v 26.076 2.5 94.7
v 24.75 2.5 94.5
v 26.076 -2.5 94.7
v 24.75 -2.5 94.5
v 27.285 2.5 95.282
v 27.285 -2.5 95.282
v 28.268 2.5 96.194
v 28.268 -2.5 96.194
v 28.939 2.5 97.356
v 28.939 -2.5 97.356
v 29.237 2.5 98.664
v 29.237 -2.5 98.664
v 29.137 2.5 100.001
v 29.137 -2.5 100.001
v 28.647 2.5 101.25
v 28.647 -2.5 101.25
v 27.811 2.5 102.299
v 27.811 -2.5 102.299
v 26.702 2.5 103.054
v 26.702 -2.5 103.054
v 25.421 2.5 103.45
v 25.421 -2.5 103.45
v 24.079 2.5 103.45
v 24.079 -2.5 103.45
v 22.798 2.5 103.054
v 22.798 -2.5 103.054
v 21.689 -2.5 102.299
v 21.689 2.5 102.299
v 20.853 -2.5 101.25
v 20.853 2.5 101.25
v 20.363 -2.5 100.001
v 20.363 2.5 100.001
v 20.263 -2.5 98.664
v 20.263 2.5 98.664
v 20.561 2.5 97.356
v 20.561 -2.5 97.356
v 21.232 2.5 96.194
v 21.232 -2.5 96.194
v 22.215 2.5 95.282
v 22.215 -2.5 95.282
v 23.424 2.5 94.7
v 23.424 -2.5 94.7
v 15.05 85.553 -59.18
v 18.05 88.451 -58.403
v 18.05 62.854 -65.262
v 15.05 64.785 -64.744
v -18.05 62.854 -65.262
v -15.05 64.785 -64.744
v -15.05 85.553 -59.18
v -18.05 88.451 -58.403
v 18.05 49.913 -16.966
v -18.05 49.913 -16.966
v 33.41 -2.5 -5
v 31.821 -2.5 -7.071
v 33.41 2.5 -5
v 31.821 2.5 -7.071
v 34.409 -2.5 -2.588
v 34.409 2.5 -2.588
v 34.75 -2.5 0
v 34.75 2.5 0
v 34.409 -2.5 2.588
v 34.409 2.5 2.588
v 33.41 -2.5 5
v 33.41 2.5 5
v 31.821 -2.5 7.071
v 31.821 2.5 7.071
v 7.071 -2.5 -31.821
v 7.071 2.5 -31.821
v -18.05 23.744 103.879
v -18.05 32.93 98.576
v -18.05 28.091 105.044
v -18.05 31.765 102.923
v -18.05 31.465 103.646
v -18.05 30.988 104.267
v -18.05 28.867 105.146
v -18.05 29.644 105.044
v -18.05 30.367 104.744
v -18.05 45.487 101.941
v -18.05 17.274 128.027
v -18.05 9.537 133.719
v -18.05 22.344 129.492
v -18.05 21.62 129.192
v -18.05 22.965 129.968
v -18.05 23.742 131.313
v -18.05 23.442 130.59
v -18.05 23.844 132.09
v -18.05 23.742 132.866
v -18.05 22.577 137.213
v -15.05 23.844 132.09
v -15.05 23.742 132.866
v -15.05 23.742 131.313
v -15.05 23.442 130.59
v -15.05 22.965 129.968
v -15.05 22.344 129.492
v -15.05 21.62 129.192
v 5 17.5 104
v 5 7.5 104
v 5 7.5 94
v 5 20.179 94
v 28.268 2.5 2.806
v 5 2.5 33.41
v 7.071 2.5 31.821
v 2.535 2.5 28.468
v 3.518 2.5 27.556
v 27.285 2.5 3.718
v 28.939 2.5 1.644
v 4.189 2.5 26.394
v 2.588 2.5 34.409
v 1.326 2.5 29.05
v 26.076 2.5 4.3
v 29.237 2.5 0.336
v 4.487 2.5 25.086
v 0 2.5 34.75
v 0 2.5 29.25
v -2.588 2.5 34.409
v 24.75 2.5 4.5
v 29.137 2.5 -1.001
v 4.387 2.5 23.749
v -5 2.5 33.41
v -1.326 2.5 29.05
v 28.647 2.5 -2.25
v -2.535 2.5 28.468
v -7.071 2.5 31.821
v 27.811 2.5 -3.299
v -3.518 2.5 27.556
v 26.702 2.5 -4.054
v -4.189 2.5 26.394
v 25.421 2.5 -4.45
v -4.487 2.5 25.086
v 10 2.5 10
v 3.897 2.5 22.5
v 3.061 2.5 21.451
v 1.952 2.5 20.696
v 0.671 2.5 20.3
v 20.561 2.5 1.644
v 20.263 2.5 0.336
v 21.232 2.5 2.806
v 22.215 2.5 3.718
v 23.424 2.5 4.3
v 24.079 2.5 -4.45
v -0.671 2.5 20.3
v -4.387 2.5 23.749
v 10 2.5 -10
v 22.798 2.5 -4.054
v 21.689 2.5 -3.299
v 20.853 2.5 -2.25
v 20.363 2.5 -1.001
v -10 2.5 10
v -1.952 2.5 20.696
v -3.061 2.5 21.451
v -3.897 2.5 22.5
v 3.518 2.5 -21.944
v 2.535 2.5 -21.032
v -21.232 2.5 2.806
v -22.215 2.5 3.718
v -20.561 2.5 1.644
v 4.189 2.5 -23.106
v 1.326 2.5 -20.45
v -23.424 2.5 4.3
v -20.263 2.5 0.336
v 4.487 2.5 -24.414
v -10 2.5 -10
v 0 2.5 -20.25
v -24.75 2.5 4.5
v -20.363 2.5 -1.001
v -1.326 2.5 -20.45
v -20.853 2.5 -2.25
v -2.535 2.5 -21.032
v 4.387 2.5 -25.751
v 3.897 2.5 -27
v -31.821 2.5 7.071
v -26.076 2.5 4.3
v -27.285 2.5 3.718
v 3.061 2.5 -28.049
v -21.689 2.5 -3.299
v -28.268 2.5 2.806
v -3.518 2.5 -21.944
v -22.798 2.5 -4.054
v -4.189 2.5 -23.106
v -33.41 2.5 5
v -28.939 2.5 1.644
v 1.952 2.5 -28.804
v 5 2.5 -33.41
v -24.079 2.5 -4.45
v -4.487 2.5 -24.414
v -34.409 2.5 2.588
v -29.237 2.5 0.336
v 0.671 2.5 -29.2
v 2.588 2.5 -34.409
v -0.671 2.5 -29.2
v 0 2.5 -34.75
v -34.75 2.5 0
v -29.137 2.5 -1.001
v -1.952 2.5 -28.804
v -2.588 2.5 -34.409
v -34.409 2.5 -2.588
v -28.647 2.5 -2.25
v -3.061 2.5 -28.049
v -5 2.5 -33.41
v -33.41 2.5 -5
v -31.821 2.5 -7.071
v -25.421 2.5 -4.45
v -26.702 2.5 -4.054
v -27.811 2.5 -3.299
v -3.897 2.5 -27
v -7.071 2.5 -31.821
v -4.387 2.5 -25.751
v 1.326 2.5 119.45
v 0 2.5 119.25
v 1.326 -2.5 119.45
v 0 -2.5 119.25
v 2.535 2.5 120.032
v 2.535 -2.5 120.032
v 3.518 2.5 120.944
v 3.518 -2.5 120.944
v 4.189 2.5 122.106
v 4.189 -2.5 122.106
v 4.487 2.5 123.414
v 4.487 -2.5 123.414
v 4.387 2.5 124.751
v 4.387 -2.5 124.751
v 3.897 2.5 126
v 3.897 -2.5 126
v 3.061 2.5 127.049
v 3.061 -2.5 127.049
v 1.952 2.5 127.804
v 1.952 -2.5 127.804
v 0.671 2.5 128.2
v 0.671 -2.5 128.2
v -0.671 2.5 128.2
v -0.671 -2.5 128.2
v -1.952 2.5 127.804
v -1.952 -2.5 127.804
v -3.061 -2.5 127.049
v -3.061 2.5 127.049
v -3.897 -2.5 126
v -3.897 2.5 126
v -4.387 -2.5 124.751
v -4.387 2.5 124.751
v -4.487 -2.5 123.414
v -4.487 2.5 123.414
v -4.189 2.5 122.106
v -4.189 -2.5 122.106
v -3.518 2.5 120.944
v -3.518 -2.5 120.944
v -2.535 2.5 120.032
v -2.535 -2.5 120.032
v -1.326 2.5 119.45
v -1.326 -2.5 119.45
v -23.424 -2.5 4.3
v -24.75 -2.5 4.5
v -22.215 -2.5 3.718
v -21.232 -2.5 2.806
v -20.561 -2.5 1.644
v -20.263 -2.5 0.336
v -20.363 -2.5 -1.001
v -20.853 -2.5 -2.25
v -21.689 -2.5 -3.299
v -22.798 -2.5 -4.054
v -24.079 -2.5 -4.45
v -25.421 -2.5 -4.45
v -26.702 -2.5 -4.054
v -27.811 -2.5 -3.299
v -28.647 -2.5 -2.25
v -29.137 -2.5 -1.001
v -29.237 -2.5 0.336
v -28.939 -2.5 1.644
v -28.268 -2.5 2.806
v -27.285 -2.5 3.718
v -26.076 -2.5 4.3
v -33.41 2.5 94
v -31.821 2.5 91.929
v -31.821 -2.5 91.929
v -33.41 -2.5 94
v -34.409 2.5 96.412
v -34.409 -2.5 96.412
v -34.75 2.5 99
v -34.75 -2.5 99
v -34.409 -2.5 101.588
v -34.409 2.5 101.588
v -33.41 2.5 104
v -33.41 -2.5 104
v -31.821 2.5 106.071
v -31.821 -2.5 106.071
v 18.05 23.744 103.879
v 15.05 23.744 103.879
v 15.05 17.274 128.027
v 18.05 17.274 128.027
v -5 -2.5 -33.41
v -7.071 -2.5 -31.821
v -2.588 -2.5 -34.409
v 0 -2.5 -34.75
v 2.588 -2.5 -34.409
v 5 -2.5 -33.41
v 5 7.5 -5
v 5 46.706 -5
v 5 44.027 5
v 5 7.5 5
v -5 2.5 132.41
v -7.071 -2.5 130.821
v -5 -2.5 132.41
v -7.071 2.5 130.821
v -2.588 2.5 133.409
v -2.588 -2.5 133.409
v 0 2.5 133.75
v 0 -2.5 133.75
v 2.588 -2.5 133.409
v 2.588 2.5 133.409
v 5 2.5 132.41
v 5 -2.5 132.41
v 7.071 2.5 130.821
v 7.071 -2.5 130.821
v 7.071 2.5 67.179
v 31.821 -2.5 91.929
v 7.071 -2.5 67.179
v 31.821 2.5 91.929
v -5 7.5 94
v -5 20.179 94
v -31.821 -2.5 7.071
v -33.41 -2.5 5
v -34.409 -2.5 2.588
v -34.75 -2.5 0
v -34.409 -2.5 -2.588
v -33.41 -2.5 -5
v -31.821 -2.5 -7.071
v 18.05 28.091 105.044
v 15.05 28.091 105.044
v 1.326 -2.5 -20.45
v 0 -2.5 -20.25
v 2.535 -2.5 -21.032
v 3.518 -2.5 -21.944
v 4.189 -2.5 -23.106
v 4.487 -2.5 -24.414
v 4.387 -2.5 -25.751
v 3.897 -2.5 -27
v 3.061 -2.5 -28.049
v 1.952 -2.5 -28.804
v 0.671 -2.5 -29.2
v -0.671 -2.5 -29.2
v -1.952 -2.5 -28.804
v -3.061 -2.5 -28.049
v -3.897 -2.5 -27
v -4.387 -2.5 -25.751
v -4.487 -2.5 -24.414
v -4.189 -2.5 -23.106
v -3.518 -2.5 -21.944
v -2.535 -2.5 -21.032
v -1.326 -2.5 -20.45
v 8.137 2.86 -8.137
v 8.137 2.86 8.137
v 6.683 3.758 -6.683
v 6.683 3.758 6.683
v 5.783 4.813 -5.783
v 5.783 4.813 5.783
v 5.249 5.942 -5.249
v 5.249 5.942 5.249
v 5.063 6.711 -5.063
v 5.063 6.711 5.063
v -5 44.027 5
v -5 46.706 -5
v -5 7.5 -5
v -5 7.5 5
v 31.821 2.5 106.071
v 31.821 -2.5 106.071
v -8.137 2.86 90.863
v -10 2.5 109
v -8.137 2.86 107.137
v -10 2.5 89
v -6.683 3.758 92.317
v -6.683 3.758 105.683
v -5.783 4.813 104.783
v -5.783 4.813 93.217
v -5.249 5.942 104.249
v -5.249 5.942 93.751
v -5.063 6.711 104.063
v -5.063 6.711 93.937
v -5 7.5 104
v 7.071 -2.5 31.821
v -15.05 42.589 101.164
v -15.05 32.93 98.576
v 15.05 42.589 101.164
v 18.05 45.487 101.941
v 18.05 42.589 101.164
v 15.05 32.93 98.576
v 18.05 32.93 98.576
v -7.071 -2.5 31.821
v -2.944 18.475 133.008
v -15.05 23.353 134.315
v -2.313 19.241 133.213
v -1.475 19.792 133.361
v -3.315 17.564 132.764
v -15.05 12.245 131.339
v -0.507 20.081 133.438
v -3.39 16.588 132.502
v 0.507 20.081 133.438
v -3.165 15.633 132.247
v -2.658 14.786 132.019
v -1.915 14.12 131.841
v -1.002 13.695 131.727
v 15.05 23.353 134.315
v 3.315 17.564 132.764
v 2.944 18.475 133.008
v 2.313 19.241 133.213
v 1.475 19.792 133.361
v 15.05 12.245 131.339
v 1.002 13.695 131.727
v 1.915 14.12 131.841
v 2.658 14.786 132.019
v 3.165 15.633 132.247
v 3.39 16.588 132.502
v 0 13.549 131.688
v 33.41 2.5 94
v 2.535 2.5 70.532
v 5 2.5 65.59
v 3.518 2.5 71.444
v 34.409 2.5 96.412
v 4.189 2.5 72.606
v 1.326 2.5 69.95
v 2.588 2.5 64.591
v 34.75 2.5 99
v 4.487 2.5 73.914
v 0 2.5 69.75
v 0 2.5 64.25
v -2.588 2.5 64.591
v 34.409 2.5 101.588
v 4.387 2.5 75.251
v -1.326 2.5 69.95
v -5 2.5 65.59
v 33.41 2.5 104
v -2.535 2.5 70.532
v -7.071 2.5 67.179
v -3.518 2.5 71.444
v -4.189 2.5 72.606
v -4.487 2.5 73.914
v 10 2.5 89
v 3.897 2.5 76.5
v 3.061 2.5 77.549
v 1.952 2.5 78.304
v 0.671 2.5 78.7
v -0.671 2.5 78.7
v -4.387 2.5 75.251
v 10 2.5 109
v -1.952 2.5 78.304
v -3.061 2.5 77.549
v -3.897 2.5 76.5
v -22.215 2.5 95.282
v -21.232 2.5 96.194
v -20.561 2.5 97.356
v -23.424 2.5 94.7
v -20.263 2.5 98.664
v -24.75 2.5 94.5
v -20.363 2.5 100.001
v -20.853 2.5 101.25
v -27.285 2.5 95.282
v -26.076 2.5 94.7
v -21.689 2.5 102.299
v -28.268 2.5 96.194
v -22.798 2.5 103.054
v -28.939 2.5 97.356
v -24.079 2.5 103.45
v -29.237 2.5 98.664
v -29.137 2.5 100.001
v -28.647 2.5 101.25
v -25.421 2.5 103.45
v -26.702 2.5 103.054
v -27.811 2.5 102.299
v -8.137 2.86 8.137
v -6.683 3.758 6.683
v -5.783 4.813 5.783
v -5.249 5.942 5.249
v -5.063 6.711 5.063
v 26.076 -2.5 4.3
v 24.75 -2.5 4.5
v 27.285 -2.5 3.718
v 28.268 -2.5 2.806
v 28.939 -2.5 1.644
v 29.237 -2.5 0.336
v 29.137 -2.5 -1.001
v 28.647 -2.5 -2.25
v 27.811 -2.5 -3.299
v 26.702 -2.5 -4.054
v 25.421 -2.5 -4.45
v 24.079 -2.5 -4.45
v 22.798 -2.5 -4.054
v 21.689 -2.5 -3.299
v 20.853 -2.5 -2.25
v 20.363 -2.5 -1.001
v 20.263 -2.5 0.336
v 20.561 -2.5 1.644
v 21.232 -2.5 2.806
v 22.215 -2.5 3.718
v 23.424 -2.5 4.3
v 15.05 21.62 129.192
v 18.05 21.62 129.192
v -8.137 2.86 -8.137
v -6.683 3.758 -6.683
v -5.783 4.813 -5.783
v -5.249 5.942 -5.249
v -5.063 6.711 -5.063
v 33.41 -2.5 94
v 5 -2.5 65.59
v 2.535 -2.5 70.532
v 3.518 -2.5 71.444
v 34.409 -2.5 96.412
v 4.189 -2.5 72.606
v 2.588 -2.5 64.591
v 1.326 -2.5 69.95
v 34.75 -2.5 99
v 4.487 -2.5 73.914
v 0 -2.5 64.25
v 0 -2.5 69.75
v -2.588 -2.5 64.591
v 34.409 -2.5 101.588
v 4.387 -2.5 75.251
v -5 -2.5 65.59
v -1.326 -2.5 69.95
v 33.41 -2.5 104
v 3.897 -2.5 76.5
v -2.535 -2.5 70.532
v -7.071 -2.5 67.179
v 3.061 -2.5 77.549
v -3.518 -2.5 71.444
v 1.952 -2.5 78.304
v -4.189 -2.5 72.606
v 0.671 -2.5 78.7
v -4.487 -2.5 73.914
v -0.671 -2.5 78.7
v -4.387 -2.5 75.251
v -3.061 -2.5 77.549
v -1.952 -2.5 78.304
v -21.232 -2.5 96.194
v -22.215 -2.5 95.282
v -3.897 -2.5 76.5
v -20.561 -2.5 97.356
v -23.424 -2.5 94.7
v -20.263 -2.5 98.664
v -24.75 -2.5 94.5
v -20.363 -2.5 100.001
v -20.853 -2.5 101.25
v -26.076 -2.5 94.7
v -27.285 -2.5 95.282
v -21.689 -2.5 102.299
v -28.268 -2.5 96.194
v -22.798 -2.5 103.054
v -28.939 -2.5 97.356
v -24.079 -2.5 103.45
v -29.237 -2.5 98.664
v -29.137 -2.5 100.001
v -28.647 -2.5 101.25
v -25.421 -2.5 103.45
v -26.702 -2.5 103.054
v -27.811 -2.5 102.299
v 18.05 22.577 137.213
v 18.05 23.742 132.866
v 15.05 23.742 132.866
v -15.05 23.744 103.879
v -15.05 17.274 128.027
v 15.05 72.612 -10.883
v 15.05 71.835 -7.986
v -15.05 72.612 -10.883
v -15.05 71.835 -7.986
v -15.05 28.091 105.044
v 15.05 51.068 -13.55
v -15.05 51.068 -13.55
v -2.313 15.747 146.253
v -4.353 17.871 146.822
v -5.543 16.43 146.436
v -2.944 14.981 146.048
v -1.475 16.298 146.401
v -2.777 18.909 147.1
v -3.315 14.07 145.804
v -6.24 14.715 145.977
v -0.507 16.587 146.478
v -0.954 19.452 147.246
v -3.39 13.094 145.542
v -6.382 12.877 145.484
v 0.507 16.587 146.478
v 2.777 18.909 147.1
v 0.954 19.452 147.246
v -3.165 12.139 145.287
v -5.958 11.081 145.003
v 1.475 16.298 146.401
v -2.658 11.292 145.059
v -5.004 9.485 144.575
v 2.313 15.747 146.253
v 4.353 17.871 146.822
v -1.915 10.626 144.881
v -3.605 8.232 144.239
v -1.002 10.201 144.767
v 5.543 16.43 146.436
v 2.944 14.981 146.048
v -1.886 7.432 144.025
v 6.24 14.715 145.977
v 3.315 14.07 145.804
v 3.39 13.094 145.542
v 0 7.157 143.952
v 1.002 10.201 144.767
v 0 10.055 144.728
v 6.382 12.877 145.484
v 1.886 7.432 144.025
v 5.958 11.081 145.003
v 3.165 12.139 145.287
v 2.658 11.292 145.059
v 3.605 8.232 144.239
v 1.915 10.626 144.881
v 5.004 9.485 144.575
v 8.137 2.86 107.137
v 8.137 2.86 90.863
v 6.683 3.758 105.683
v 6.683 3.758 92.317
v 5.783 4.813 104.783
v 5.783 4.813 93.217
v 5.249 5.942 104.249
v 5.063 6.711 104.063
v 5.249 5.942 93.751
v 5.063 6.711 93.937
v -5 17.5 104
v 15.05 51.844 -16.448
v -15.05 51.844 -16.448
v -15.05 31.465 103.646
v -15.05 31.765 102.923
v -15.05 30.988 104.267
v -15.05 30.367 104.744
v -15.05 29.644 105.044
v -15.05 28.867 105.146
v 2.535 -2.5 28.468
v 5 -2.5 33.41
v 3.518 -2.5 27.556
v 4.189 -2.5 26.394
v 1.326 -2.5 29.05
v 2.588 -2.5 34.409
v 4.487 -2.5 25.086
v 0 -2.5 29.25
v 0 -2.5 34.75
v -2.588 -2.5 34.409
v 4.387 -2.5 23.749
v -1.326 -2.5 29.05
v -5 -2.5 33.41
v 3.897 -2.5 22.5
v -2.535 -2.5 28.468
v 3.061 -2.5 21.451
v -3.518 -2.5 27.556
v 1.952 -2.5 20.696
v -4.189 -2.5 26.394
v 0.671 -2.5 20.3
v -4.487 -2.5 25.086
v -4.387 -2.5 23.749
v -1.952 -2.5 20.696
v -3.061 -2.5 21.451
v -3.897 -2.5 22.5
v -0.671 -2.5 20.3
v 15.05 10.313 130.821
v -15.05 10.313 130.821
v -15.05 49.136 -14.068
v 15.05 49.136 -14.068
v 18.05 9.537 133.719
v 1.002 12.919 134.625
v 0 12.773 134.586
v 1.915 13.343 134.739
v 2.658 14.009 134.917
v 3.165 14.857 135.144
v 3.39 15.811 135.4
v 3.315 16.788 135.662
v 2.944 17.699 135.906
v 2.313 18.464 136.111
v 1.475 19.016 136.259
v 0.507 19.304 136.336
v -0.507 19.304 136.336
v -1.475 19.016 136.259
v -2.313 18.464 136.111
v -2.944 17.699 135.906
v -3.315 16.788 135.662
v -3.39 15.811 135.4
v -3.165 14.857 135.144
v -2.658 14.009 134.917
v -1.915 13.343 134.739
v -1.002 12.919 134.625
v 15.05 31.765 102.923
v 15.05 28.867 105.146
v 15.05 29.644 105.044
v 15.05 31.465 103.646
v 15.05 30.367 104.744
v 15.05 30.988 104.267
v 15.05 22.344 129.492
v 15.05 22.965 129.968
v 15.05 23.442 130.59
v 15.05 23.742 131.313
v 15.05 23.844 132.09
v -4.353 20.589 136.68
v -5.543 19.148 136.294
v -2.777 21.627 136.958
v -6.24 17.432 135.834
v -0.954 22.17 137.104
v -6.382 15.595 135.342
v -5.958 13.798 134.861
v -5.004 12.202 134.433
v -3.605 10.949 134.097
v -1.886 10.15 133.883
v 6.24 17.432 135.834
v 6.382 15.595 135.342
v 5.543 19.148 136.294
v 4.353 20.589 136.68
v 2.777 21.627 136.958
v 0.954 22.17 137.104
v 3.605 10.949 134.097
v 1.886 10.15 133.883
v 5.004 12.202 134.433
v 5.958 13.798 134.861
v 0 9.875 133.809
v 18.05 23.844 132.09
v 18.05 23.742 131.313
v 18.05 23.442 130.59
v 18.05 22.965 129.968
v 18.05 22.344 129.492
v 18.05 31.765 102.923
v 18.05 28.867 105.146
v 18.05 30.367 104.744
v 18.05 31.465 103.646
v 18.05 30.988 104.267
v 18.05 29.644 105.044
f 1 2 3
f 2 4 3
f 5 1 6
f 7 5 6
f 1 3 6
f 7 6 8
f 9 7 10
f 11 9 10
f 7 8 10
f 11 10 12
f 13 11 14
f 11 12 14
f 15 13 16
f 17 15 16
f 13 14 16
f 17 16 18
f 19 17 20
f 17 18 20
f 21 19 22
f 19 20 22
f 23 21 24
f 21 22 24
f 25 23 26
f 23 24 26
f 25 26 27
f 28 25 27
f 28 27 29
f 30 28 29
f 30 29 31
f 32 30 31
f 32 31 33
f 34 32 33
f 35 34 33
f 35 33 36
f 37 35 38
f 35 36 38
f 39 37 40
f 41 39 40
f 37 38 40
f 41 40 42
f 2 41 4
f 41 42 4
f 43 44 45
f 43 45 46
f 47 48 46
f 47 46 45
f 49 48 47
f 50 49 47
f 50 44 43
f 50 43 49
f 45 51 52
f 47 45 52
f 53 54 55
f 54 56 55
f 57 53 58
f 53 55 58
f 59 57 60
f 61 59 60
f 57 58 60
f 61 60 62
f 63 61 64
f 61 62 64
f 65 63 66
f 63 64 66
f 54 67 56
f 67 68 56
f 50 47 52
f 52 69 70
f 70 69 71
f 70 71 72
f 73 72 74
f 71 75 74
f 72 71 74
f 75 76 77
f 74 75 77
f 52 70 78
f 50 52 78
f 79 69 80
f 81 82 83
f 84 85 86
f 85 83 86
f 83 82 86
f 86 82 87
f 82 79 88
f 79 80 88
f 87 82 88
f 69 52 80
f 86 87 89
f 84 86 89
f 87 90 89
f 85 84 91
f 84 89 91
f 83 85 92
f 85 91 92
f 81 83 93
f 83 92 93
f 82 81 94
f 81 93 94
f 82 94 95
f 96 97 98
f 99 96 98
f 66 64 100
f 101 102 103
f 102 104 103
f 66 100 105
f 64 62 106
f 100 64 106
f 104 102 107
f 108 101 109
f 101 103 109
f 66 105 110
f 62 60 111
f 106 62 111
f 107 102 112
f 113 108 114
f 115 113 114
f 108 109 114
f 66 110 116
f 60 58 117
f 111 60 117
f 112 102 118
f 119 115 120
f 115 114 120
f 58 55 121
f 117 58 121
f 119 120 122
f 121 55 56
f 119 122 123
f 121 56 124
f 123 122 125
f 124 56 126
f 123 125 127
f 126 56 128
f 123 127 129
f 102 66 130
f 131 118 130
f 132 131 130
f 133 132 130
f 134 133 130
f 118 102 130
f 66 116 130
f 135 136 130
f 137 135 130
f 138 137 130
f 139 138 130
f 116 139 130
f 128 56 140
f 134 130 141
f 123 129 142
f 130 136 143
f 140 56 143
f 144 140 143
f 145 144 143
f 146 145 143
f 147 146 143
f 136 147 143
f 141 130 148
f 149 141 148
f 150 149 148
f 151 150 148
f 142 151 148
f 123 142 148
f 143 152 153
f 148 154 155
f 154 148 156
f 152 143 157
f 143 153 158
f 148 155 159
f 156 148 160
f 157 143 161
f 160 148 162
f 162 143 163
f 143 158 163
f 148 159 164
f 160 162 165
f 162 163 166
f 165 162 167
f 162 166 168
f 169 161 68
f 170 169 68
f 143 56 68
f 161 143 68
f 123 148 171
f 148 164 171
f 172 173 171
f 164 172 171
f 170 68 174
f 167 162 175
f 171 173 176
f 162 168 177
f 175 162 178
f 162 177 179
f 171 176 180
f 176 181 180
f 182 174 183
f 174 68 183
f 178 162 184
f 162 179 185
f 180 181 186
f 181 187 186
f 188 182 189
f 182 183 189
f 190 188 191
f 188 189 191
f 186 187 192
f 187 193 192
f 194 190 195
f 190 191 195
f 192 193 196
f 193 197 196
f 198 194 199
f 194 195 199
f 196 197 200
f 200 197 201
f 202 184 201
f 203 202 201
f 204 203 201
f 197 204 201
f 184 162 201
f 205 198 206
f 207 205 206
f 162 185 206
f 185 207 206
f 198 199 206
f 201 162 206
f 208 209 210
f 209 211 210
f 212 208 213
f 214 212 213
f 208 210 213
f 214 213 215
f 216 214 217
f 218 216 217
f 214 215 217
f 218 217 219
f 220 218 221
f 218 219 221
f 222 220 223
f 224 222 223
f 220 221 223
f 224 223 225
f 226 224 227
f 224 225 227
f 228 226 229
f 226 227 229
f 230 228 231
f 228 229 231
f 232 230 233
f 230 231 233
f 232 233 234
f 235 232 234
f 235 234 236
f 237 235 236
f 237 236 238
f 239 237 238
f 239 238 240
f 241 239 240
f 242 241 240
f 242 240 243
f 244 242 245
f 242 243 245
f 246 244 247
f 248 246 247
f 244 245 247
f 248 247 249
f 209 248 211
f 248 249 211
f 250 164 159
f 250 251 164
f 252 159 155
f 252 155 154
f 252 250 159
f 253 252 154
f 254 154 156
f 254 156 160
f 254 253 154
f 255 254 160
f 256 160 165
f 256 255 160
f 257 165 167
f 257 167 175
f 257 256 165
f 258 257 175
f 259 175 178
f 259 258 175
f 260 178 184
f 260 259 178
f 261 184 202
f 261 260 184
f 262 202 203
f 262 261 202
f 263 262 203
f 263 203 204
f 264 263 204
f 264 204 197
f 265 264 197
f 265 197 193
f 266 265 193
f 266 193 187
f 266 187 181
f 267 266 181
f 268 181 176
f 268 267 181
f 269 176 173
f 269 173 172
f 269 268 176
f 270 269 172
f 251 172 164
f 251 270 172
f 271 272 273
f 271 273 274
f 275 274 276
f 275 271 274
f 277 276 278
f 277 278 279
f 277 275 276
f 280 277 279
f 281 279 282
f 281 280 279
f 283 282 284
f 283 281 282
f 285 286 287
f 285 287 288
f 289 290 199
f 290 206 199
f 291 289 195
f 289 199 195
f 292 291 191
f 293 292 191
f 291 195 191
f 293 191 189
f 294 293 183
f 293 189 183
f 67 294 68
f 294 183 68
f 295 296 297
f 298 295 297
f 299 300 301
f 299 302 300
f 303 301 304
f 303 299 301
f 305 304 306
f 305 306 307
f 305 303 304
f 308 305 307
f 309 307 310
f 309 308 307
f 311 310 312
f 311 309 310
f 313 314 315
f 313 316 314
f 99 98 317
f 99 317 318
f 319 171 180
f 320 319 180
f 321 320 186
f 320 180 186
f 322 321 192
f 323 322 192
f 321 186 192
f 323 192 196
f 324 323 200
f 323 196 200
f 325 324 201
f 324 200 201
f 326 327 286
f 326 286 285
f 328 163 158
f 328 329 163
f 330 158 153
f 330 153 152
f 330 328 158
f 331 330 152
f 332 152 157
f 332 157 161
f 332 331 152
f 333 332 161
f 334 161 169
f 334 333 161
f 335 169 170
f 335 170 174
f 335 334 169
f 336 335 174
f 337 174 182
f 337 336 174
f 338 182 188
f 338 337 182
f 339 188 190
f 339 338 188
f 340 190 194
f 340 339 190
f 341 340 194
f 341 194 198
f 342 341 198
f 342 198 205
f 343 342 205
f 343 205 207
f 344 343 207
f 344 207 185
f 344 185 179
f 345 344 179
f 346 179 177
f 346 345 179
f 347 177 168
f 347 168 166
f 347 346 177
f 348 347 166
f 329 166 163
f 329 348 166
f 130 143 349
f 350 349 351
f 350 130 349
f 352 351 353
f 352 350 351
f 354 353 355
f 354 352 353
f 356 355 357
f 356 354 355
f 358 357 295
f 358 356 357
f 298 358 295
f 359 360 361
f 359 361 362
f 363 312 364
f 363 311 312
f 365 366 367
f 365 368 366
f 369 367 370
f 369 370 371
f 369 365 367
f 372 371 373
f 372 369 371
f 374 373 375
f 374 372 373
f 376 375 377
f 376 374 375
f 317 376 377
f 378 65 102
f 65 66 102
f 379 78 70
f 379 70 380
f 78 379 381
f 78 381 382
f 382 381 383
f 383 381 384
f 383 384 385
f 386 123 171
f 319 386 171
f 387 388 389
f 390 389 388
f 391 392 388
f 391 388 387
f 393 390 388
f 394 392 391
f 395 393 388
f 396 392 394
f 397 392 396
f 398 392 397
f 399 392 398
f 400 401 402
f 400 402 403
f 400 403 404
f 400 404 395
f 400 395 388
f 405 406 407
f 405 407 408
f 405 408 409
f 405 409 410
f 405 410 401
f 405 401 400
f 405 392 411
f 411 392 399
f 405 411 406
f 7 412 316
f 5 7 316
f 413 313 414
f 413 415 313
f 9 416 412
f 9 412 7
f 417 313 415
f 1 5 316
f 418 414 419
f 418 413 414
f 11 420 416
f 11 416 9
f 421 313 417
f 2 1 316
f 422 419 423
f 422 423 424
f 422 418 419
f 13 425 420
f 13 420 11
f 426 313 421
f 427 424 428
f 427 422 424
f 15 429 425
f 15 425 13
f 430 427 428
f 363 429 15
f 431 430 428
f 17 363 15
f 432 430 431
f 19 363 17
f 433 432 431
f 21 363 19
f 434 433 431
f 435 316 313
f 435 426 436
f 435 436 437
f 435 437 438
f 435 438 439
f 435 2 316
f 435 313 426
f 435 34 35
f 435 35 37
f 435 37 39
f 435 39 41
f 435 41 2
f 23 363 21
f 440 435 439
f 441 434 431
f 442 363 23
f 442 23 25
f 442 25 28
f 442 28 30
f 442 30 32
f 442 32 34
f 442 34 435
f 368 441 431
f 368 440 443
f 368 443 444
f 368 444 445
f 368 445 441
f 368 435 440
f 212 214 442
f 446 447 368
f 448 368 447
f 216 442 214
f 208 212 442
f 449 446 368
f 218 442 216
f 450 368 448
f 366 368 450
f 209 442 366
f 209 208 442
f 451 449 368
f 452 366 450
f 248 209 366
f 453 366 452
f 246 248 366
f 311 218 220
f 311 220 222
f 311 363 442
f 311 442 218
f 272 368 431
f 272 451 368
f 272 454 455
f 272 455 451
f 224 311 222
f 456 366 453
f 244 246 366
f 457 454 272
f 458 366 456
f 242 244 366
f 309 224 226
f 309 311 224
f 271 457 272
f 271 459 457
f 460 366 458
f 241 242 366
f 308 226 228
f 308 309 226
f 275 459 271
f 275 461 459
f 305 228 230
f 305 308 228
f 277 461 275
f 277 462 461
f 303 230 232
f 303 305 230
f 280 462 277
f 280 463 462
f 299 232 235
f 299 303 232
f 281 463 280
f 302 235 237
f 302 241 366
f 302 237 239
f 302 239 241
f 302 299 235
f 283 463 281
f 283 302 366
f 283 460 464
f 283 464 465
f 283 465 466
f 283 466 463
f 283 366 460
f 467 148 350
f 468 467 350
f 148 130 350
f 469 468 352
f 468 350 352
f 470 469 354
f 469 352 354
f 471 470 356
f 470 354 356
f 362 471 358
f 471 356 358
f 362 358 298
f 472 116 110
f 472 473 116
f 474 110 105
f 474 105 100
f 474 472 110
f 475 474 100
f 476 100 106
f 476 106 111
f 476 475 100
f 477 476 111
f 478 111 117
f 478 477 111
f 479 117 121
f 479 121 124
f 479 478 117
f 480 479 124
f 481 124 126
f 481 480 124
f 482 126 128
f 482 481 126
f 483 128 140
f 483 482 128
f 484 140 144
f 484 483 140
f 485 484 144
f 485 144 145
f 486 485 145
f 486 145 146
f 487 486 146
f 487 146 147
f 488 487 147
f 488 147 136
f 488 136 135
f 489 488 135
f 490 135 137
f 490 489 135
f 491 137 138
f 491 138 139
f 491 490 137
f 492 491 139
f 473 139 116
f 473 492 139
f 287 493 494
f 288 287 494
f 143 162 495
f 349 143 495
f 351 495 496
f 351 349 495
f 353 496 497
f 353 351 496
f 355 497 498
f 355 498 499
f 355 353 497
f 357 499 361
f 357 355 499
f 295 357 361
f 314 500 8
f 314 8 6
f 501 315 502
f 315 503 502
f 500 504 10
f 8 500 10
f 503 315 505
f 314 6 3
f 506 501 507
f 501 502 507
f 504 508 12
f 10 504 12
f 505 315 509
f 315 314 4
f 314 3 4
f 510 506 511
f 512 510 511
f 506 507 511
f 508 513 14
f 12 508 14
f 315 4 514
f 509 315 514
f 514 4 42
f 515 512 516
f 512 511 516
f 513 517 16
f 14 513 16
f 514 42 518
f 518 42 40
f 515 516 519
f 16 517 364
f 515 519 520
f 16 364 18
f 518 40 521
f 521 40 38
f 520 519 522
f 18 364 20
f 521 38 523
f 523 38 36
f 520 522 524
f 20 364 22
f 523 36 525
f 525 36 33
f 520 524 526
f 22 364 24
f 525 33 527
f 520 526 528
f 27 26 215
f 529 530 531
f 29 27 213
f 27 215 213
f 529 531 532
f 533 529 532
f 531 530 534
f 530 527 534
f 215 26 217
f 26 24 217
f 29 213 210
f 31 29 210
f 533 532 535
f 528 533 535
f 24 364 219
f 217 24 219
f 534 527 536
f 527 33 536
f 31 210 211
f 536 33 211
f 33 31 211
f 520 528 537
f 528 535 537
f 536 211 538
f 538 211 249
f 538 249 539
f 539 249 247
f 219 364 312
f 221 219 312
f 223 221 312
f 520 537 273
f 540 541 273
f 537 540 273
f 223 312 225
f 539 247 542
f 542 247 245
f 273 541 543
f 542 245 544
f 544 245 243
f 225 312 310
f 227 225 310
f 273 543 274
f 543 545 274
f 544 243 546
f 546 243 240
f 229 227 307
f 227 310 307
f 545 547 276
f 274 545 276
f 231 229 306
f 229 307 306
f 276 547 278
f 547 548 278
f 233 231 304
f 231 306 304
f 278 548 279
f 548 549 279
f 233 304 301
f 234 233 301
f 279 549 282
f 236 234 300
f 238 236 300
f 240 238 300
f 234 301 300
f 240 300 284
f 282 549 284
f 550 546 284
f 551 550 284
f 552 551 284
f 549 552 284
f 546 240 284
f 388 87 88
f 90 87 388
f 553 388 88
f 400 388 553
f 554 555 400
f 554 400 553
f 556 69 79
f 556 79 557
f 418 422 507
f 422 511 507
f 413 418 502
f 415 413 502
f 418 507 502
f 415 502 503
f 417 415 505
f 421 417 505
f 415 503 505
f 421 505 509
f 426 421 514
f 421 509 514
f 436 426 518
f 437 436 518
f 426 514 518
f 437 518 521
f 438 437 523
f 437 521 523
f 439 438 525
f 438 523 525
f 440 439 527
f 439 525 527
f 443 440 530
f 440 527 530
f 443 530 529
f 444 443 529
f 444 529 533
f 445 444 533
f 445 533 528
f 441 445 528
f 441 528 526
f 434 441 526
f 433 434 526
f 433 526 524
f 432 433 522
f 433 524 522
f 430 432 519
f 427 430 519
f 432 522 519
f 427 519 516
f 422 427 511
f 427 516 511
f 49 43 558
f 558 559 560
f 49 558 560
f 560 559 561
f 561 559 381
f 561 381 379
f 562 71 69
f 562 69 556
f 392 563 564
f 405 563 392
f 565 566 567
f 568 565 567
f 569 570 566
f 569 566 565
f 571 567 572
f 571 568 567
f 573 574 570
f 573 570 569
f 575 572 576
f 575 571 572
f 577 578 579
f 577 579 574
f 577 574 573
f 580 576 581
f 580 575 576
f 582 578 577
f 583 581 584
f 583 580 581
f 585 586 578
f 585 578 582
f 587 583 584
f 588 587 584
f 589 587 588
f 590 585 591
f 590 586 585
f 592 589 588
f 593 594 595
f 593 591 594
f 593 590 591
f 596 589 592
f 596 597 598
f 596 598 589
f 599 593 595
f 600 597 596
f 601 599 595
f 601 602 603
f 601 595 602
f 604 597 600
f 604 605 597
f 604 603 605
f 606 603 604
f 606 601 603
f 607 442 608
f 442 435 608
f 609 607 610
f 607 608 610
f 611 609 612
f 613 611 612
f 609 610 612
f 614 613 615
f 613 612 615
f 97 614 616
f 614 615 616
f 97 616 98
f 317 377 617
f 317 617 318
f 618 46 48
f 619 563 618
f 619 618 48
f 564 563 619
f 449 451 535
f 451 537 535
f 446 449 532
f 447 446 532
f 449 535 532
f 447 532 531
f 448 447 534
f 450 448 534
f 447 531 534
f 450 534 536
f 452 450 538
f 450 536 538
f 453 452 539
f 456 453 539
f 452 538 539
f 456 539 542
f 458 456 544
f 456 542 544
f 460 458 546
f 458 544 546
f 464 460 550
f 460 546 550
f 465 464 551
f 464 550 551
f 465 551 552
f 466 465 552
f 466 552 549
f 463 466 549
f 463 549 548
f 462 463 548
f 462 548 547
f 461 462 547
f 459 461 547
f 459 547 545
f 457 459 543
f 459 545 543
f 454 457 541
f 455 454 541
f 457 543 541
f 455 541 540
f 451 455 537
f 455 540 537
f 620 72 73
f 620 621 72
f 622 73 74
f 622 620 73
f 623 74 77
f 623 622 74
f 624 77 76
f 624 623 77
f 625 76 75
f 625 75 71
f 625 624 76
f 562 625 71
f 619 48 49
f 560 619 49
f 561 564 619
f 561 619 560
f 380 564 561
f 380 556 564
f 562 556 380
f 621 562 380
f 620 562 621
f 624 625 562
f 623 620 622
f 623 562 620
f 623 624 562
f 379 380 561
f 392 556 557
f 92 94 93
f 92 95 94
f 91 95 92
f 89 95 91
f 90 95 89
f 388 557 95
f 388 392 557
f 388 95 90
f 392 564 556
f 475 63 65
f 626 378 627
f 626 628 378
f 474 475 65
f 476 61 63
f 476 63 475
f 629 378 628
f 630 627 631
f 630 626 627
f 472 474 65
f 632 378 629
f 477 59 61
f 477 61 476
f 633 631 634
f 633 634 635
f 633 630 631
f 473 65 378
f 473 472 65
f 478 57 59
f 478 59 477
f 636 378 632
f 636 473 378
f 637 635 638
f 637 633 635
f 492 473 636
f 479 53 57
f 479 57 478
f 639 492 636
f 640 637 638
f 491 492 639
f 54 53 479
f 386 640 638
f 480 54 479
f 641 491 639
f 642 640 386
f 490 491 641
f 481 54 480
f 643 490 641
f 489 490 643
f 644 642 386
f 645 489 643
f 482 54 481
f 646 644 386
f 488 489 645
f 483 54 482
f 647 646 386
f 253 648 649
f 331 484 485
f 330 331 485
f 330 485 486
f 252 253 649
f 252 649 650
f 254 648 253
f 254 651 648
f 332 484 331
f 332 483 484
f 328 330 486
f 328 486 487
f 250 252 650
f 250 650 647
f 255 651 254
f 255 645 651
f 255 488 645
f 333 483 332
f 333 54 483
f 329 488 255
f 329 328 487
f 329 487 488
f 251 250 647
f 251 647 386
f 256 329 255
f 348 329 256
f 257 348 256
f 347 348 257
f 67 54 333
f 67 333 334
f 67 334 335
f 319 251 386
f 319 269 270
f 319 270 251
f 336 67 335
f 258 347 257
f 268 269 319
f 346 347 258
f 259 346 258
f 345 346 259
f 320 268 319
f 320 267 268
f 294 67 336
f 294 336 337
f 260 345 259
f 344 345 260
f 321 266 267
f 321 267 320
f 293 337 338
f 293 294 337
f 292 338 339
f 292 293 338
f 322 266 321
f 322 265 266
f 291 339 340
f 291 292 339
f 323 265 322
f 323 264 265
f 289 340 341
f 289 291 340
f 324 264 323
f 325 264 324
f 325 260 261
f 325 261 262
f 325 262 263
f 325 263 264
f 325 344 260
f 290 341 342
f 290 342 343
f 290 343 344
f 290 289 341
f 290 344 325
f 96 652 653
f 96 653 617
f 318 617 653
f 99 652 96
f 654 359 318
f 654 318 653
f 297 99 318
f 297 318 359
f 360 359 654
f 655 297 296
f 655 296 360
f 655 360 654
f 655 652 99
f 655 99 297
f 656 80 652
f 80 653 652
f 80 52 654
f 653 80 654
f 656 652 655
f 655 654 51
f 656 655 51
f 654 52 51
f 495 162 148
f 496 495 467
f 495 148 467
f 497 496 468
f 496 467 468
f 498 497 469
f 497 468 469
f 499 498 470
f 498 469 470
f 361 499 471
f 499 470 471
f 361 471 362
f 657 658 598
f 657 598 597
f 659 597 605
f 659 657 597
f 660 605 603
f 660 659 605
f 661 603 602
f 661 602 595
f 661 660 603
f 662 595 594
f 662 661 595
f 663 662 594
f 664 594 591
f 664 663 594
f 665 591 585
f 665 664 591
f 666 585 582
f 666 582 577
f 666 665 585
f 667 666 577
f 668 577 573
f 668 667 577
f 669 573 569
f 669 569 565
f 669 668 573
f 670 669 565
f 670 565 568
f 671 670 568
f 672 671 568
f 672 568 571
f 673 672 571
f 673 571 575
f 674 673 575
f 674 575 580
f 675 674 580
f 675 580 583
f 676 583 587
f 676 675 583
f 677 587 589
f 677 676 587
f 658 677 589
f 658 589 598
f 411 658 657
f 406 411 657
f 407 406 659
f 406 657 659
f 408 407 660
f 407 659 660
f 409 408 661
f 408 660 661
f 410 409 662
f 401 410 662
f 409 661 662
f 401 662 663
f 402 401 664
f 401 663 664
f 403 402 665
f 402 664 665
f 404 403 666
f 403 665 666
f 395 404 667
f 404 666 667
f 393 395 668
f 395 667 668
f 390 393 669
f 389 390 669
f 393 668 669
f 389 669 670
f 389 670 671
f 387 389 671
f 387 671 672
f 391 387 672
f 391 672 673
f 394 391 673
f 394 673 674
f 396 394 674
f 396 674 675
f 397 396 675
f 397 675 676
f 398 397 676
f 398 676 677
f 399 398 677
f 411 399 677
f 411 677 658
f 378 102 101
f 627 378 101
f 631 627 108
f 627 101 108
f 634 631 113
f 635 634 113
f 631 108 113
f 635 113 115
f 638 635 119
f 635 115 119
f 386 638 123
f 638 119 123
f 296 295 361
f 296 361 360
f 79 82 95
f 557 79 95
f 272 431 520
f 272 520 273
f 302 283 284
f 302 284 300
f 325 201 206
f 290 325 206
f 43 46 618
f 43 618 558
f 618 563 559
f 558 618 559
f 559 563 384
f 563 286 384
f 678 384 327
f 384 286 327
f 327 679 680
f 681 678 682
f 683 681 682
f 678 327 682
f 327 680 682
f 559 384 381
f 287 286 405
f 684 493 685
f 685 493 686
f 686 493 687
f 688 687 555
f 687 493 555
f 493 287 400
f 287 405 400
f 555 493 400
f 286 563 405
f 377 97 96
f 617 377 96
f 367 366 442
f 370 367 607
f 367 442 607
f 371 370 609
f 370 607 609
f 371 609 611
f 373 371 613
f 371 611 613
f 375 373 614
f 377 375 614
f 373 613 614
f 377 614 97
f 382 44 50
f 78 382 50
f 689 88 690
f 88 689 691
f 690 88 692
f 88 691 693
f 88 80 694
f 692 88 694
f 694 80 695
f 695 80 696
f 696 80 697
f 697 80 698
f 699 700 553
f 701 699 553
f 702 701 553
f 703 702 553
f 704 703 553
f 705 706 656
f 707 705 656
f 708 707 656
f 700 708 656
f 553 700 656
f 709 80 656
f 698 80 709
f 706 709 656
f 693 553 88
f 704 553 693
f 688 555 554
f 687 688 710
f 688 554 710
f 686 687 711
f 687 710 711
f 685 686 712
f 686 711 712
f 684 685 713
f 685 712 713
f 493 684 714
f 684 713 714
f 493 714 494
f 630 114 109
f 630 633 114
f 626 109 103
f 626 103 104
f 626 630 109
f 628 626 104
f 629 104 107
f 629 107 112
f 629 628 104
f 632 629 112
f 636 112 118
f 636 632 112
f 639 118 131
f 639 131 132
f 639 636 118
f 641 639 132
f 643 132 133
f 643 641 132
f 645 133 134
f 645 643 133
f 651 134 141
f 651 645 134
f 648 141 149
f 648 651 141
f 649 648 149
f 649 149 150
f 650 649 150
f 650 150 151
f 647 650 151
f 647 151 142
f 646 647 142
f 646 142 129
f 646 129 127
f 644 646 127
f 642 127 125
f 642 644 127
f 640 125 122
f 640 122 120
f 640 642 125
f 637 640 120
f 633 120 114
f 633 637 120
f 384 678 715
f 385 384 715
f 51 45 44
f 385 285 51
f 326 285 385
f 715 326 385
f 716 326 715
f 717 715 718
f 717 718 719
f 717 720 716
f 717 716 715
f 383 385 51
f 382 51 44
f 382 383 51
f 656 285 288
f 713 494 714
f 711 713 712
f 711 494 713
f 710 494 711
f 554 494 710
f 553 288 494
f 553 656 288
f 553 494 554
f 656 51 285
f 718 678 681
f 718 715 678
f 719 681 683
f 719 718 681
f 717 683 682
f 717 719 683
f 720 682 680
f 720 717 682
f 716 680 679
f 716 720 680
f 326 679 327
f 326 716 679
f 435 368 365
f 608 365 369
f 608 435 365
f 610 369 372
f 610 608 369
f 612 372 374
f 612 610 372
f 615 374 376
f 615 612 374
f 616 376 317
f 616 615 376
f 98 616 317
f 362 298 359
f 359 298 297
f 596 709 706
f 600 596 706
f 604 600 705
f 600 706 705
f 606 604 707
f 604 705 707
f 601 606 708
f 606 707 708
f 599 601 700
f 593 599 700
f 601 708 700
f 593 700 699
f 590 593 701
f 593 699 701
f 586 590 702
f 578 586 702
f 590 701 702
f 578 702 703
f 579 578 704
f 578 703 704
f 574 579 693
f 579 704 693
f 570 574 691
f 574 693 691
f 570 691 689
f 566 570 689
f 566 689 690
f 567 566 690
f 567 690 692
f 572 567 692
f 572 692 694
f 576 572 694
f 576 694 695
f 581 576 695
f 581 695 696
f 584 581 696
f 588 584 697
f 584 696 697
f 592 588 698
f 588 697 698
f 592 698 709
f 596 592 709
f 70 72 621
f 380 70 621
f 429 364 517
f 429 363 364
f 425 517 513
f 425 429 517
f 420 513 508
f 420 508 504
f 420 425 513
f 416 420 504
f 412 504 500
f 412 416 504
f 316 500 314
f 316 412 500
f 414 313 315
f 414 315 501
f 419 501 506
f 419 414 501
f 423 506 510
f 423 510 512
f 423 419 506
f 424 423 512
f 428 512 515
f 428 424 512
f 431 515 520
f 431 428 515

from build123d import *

# Parameters (mm, degrees)
SKETCH1_R                = 4.5
BOSS_EXTRUDE1_DEPTH      = 2.5
SKETCH2_W                = 10
SKETCH2_H                = 45
BOSS_EXTRUDE2_DEPTH      = 5
CUT_EXTRUDE1_DEPTH       = 147.126229678
CUT_EXTRUDE1_DEPTH_BACK  = 147.126229678
BOSS_EXTRUDE3_DEPTH      = 15.05
FILLET1_R                = 5
FILLET2_R                = 5
BOSS_EXTRUDE4_DEPTH      = 16.5
BOSS_EXTRUDE4_DEPTH_BACK = 2.000004
SKETCH6_W                = 36.1
SKETCH6_H                = 156
SKETCH6_W_2              = 30.1
SKETCH6_H_2              = 150
BOSS_EXTRUDE5_DEPTH      = 5
SKETCH8_W                = 36.1
SKETCH8_H                = 116
BOSS_EXTRUDE6_DEPTH      = 3
CUT_EXTRUDE2_REACH       = 183.097
SKETCH10_W               = 30.1
SKETCH10_H               = 21.5
SKETCH11_W               = 36.1
SKETCH11_H               = 40
CUT_EXTRUDE3_DEPTH       = 5
SKETCH12_W               = 3
SKETCH12_H               = 25
CUT_EXTRUDE4_DEPTH       = 7.5
CUT_EXTRUDE5_REACH       = 195.973
SKETCH13_R               = 3.4
SKETCH14_R               = 6.4
SKETCH14_R_2             = 3.4
BOSS_EXTRUDE7_DEPTH      = 10.5
FILLET3_R                = 3
SKETCH15_W               = 36.1
SKETCH15_H               = 26.5
SKETCH15_W_2             = 30.1
SKETCH15_H_2             = 21.5
BOSS_EXTRUDE8_DEPTH      = 50


with BuildPart() as part:
    # Sketch1 → Boss-Extrude1 (new, symmetric)
    with BuildSketch(Plane(origin=(0, 0, 0), x_dir=(1, 0, 0), z_dir=(0, 1, 0))):
        with BuildLine():
            Line((-31.821067812, 7.071067812), (-7.071067812, 31.821067812))
            ThreePointArc((-7.071067812, 31.821067812), (0, 34.75), (7.071067812, 31.821067812))
            Line((7.071067812, 31.821067812), (31.821067812, 7.071067812))
            ThreePointArc((31.821067812, 7.071067812), (34.75, 0), (31.821067812, -7.071067812))
            Line((31.821067812, -7.071067812), (7.071067812, -31.821067812))
            ThreePointArc((7.071067812, -31.821067812), (0, -34.75), (-7.071067812, -31.821067812))
            Line((-7.071067812, -31.821067812), (-31.821067812, -7.071067812))
            ThreePointArc((-31.821067812, -7.071067812), (-34.75, 0), (-31.821067812, 7.071067812))
        make_face()
        with Locations(Location((0, 24.75, 0), (0, 0, 270))):
            Circle(SKETCH1_R, mode=Mode.SUBTRACT)
        with Locations(Location((24.75, 0, 0), (0, 0, 270))):
            Circle(SKETCH1_R, mode=Mode.SUBTRACT)
        with Locations(Location((0, -24.75, 0), (0, 0, 270))):
            Circle(SKETCH1_R, mode=Mode.SUBTRACT)
        with Locations(Location((-24.75, 0, 0), (0, 0, 270))):
            Circle(SKETCH1_R, mode=Mode.SUBTRACT)
    extrude(amount=BOSS_EXTRUDE1_DEPTH, both=True)


with BuildPart() as body_2:
    # Mirror3: mirrored copy
    add(part.part.mirror(Plane.XY.offset(49.5)))


with BuildPart() as body_3:
    # Sketch2 → Boss-Extrude2 (new, symmetric)
    with BuildSketch(Plane(origin=(0, 0, 0), x_dir=(0, 0, -1), z_dir=(1, 0, 0))):
        with Locations((-99, 25)):
            Rectangle(SKETCH2_W, SKETCH2_H)
    extrude(amount=BOSS_EXTRUDE2_DEPTH, both=True)


with BuildPart() as body_4:
    # Mirror5: mirrored copy
    add(body_3.part.mirror(Plane.XY.offset(49.5)))


with BuildPart() as cut_extrude1_tool:
    # Sketch3 → Cut-Extrude1 (new, two sides: drawn at the far end of the back side and taken through both)
    with BuildSketch(Plane(origin=(0, 0, 0), x_dir=(0, 0, -1), z_dir=(1, 0, 0)).offset(-CUT_EXTRUDE1_DEPTH_BACK)):
        Polygon((-398.060619113, -61.293305417), (-104, 17.5), (5, 46.706461975), (299.060619113, 125.499767392), (141.474008279, 713.621005618), (-555.647229947, 526.827932809), align=None)
    extrude(amount=CUT_EXTRUDE1_DEPTH + CUT_EXTRUDE1_DEPTH_BACK)


with BuildPart() as body_3_1:
    add(body_3.part)

    # Cut-Extrude1: cut by cut_extrude1_tool
    add(cut_extrude1_tool.part, mode=Mode.SUBTRACT)


with BuildPart() as body_4_1:
    add(body_4.part)

    # Cut-Extrude1: cut by cut_extrude1_tool
    add(cut_extrude1_tool.part, mode=Mode.SUBTRACT)

    # Combine2: union part
    add(part.part)

    # Fillet2
    fillet2_edges = [body_4_1.edges().sort_by_distance(p)[0] for p in [
        (-5, 2.5, 0),
        (0, 2.5, 5),
        (0, 2.5, -5),
        (5, 2.5, 0),
    ]]
    fillet(fillet2_edges, radius=FILLET2_R)


with BuildPart() as body_5:
    # Sketch4 → Boss-Extrude3 (new, symmetric)
    with BuildSketch(Plane(origin=(0, 0, 0), x_dir=(0, 0, -1), z_dir=(1, 0, 0))):
        Polygon((-130.821067812, 10.31331654), (14.067806131, 49.136173305), (13.550168041, 51.068024958), (-131.338705902, 12.245168192), align=None)
    extrude(amount=BOSS_EXTRUDE3_DEPTH, both=True)



with BuildPart() as body_2_1:
    add(body_2.part)

    # Combine1: union body 3
    add(body_3_1.part)

    # Fillet1
    fillet1_edges = [body_2_1.edges().sort_by_distance(p)[0] for p in [
        (0, 2.5, 94),
        (5, 2.5, 99),
        (-5, 2.5, 99),
        (0, 2.5, 104),
    ]]
    fillet(fillet1_edges, radius=FILLET1_R)


with BuildPart() as body_5_1:
    add(body_5.part)

    add(body_2_1.part)  # Boss-Extrude4 merges body 2

    add(body_4_1.part)  # Boss-Extrude4 merges body 4
    # Sketch6 → Boss-Extrude4 (add, two sides: drawn at the far end of the back side and taken through both)
    with BuildSketch(Plane(origin=(0, 44.259573936, 11.859317093), x_dir=(1, 0, 0), z_dir=(0, 0.96592582628907, 0.2588190451025143)).offset(-BOSS_EXTRUDE4_DEPTH_BACK)):
        with Locations((0, -48.694165284)):
            Rectangle(SKETCH6_W, SKETCH6_H)
        with Locations((0, -48.694165284)):
            Rectangle(SKETCH6_W_2, SKETCH6_H_2, mode=Mode.SUBTRACT)
    extrude(amount=BOSS_EXTRUDE4_DEPTH + BOSS_EXTRUDE4_DEPTH_BACK)

    # Sketch7 → Boss-Extrude5 (add)
    with BuildSketch(Plane(origin=(0, 60.197350069, 16.129831338), x_dir=(1, 0, 0), z_dir=(0, 0.96592582628907, 0.25881904510251436))):
        Polygon((15.05, 26.305834716), (15.05, -86.694165284), (18.05, -86.694165284), (18.05, 29.305834716), (-18.05, 29.305834716), (-18.05, -86.694165284), (-15.05, -86.694165284), (-15.05, 26.305834716), align=None)
    extrude(amount=BOSS_EXTRUDE5_DEPTH)

    # Sketch8 → Boss-Extrude6 (add)
    with BuildSketch(Plane(origin=(0, 65.026979201, 17.423926563), x_dir=(1, 0, 0), z_dir=(0, 0.96592582628907, 0.25881904510251436))):
        with Locations((0, -28.694165284)):
            Rectangle(SKETCH8_W, SKETCH8_H)
    extrude(amount=BOSS_EXTRUDE6_DEPTH)

    # Sketch10 → Cut-Extrude2 (cut, up to next)
    with BuildSketch(Plane(origin=(0, 6.808451022, -25.409485135), x_dir=(1, 0, 0), z_dir=(0, -0.2588190451025143, 0.96592582628907)), mode=Mode.PRIVATE) as cut_extrude2_sk1:
        with Locations((0, 56.570882651)):
            Rectangle(SKETCH10_W, SKETCH10_H)
    cut_extrude2_tool1 = extrude(cut_extrude2_sk1.sketch, amount=-CUT_EXTRUDE2_REACH, mode=Mode.PRIVATE) & body_5_1.part
    add(cut_extrude2_tool1.solids().sort_by_distance((0, 61.451728, -10.767863))[0], mode=Mode.SUBTRACT)

    # Sketch11 → Cut-Extrude3 (cut)
    with BuildSketch(Plane(origin=(0, 60.197350069, 16.129831338), x_dir=(1, 0, 0), z_dir=(0, 0.96592582628907, 0.25881904510251436))):
        with Locations((0, -106.694165284)):
            Rectangle(SKETCH11_W, SKETCH11_H)
    extrude(amount=-CUT_EXTRUDE3_DEPTH, mode=Mode.SUBTRACT)

    # Sketch12 → Cut-Extrude4 (cut)
    with BuildSketch(Plane(origin=(0, 55.367720938, 14.835736112), x_dir=(1, 0, 0), z_dir=(0, 0.96592582628907, 0.25881904510251447))):
        with Locations((-16.55, -106.694165284)):
            Rectangle(SKETCH12_W, SKETCH12_H)
        with Locations((16.55, -106.694165284)):
            Rectangle(SKETCH12_W, SKETCH12_H)
    extrude(amount=-CUT_EXTRUDE4_DEPTH, mode=Mode.SUBTRACT)

    # Sketch13 → Cut-Extrude5 (cut, up to next)
    with BuildSketch(Plane(origin=(0, -32.790862879, 122.377166288), x_dir=(1, 0, 0), z_dir=(0, -0.2588190451025143, 0.96592582628907)), mode=Mode.PRIVATE) as cut_extrude5_sk1:
        with Locations(Location((0, 50.570882651, 0), (0, 0, 270))):
            Circle(SKETCH13_R)
    cut_extrude5_tool1 = extrude(cut_extrude5_sk1.sketch, amount=-CUT_EXTRUDE5_REACH, mode=Mode.PRIVATE) & body_5_1.part
    add(cut_extrude5_tool1.solids().sort_by_distance((0, 16.056859, 135.465874))[0], mode=Mode.SUBTRACT)

    # Sketch14 → Boss-Extrude7 (add)
    with BuildSketch(Plane(origin=(0, -32.790862879, 122.377166288), x_dir=(1, 0, 0), z_dir=(0, -0.2588190451025143, 0.96592582628907))):
        with Locations(Location((0, 50.570882651, 0), (0, 0, 270))):
            Circle(SKETCH14_R)
        with Locations(Location((0, 50.570882651, 0), (0, 0, 270))):
            Circle(SKETCH14_R_2, mode=Mode.SUBTRACT)
    extrude(amount=BOSS_EXTRUDE7_DEPTH)

    # Fillet3
    fillet3_edges = [body_5_1.edges().sort_by_distance(p)[0] for p in [
        (-16.55, 24.518000898, 129.968458702),
        (-16.55, 30.988477025, 105.820313045),
        (16.55, 24.518000898, 129.968458702),
        (16.55, 30.988477025, 105.820313045),
    ]]
    fillet(fillet3_edges, radius=FILLET3_R)

    # Sketch15 → Boss-Extrude8 (add)
    with BuildSketch(Plane(origin=(0, 7.584908157, -28.307262614), x_dir=(-1, 0, 0), z_dir=(0, 0.2588190451025143, -0.96592582628907))):
        with Locations((0, 57.070882651)):
            Rectangle(SKETCH15_W, SKETCH15_H)
        with Locations((0, 56.570882651)):
            Rectangle(SKETCH15_W_2, SKETCH15_H_2, mode=Mode.SUBTRACT)
    extrude(amount=BOSS_EXTRUDE8_DEPTH)


solid = body_5_1.part
